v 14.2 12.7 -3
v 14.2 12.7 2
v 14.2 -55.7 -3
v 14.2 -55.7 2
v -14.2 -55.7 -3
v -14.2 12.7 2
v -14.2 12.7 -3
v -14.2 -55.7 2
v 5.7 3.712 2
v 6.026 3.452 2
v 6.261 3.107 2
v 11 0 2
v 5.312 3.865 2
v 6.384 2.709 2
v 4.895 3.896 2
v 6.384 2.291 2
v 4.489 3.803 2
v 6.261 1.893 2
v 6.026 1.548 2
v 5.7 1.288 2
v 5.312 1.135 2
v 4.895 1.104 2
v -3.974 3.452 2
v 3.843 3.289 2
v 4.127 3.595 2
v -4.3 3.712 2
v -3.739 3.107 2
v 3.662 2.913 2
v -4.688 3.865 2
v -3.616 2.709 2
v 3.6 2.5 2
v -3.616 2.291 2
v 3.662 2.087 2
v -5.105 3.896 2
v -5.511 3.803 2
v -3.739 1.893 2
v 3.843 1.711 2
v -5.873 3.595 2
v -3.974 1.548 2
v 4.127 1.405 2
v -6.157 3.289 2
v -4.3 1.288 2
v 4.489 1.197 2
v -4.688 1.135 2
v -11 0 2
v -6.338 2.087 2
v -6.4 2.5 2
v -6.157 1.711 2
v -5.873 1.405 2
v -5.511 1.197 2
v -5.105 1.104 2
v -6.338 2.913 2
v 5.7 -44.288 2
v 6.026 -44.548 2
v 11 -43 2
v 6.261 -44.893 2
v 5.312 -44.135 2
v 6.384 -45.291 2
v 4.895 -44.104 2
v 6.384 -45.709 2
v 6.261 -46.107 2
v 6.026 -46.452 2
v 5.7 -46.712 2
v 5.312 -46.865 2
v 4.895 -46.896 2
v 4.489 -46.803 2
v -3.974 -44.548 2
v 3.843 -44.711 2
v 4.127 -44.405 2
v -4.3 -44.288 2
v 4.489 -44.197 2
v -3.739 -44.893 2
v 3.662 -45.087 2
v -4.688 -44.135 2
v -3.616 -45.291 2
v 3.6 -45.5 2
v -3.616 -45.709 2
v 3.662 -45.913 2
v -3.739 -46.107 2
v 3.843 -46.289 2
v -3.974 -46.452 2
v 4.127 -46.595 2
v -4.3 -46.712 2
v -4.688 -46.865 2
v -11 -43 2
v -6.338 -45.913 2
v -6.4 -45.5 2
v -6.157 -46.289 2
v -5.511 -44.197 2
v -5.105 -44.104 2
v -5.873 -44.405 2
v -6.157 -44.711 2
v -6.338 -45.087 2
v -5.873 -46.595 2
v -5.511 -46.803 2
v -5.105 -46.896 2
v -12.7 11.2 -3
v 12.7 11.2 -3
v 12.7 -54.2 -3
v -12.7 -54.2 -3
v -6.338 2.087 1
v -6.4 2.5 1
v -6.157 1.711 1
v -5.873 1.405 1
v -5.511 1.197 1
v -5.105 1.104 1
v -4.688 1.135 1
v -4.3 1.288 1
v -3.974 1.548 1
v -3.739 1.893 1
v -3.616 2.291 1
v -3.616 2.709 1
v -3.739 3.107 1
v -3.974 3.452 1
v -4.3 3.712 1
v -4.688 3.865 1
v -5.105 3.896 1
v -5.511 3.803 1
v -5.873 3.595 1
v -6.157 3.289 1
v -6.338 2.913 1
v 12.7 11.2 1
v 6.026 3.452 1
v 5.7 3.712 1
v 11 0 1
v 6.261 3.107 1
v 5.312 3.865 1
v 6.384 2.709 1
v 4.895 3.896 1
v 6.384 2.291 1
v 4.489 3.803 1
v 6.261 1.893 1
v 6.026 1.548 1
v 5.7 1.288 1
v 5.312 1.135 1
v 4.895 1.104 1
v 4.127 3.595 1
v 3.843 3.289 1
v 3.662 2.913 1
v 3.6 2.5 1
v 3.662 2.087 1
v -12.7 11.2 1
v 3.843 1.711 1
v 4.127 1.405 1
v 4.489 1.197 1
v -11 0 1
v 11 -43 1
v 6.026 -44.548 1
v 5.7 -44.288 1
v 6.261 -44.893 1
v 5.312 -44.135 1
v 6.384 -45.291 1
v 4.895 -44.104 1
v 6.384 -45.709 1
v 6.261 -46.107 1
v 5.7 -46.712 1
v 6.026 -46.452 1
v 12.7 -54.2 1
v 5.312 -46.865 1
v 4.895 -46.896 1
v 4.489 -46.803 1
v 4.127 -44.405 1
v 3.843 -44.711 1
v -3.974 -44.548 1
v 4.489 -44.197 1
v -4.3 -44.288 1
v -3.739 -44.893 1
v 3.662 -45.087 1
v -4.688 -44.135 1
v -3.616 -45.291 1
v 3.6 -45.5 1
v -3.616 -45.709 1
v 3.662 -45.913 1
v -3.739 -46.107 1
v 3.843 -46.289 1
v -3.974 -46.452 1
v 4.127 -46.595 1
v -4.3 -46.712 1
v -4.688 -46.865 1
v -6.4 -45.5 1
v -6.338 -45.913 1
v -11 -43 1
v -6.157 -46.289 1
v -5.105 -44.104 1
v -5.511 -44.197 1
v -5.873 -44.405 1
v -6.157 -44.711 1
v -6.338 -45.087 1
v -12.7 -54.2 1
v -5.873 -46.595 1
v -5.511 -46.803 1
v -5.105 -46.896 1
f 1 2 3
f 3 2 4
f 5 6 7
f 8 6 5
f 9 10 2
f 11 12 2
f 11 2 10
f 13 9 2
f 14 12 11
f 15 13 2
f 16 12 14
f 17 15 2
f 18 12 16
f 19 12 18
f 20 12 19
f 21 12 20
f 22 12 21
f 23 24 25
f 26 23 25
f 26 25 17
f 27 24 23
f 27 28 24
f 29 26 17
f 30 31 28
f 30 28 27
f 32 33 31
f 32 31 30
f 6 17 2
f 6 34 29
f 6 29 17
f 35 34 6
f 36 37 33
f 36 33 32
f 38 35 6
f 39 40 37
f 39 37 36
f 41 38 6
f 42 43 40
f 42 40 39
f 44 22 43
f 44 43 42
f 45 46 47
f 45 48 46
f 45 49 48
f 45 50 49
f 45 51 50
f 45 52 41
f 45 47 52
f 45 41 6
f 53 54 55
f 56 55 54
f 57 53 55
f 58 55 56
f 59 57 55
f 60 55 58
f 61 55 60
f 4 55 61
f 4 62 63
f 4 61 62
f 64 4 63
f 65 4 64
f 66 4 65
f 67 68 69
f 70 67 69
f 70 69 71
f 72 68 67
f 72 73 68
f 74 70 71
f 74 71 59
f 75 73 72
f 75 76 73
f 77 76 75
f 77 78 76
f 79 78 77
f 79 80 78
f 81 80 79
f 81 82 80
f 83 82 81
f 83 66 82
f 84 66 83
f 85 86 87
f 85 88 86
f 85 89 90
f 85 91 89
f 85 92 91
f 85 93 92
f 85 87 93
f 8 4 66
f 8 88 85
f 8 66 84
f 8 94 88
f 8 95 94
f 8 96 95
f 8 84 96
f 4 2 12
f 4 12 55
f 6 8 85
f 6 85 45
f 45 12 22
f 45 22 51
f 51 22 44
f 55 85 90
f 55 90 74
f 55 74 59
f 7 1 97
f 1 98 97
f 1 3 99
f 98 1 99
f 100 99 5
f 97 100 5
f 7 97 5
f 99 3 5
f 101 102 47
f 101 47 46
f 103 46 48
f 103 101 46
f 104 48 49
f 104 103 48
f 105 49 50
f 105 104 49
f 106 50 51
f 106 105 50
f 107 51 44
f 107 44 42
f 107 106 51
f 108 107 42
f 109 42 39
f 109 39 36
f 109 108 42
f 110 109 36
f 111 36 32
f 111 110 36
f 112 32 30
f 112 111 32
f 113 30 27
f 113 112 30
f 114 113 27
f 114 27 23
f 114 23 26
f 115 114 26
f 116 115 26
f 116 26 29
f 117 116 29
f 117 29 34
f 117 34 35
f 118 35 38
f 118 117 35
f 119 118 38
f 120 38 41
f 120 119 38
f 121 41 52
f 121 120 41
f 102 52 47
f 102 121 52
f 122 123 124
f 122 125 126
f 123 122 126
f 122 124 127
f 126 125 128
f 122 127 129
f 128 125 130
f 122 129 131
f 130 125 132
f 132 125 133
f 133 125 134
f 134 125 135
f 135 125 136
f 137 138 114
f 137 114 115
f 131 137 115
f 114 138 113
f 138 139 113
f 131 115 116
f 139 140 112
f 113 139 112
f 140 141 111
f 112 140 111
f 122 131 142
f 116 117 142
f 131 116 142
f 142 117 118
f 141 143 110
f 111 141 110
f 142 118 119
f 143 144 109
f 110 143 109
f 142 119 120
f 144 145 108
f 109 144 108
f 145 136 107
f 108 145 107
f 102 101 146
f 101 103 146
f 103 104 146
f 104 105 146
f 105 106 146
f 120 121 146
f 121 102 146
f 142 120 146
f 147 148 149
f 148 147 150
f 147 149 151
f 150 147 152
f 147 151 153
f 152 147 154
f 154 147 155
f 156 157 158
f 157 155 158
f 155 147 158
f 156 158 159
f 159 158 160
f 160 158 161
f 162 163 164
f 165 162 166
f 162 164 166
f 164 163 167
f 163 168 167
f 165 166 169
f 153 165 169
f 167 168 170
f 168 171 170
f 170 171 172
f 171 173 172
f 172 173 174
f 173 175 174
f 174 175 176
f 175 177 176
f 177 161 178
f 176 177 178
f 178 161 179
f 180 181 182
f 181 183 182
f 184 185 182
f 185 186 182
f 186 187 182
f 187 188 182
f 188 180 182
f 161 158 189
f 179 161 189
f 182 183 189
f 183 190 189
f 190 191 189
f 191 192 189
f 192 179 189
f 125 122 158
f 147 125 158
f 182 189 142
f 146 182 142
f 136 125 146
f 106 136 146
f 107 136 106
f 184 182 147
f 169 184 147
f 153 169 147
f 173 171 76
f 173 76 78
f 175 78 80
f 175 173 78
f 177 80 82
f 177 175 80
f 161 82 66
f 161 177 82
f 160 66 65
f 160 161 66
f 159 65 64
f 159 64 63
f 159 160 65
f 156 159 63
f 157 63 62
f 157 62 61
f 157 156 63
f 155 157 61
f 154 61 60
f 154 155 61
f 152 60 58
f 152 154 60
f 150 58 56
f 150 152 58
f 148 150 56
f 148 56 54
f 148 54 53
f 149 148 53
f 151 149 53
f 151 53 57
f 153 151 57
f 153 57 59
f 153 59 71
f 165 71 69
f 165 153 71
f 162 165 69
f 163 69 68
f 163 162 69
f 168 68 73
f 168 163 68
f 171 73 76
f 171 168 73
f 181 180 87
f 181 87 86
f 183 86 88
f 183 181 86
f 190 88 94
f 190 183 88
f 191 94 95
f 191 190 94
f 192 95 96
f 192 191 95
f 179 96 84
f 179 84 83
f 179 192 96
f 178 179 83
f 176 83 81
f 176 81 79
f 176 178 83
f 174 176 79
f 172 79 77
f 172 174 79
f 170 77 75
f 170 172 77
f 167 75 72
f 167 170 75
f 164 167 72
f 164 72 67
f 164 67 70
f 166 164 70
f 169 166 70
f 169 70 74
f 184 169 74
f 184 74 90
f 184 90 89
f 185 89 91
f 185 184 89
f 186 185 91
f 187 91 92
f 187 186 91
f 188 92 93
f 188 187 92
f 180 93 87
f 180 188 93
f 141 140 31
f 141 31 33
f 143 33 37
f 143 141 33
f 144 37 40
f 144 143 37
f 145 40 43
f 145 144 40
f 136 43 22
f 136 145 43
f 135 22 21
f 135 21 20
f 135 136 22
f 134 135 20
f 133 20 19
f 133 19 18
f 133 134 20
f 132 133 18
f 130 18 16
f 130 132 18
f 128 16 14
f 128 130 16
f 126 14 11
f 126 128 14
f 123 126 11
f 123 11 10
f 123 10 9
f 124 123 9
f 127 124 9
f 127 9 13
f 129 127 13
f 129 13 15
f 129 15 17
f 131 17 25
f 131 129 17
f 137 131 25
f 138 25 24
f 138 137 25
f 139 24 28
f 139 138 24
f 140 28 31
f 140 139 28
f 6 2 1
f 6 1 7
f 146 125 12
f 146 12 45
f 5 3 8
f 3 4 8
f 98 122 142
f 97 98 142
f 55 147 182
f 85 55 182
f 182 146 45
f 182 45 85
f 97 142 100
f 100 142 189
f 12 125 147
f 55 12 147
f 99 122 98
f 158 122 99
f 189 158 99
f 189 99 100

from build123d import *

# Parameters (mm, degrees)
CYLINDER005_R     = 1.4
CYLINDER005_DEPTH = 10
SKETCH001_W       = 28.4
SKETCH001_H       = 68.4
SKETCH001_W_2     = 25.4
SKETCH001_H_2     = 65.4
EXTRUDE001_DEPTH  = 4
SKETCH_W          = 28.4
SKETCH_H          = 68.4
SKETCH_R          = 1.4
SKETCH_W_2        = 22
SKETCH_H_2        = 43
EXTRUDE_DEPTH     = 1


with BuildPart() as cylinder005:
    # Cylinder005 → Cylinder005 (new body)
    with BuildSketch(Plane(origin=(-5, 2.5, -5), x_dir=(1, 0, 0), z_dir=(0, 0, 1))):
        Circle(CYLINDER005_R)
    extrude(amount=CYLINDER005_DEPTH)


with BuildPart() as extrude001:
    # Sketch001 → Extrude001 (new body)
    with BuildSketch(Plane.XY.offset(1)):
        with Locations((0, -21.5)):
            Rectangle(SKETCH001_W, SKETCH001_H)
        with Locations((0, -21.5)):
            Rectangle(SKETCH001_W_2, SKETCH001_H_2, mode=Mode.SUBTRACT)
    extrude(amount=-EXTRUDE001_DEPTH)


with BuildPart() as body001:
    # Sketch → Extrude (new body)
    with BuildSketch(Plane.XY.offset(1)):
        with Locations((0, -21.5)):
            Rectangle(SKETCH_W, SKETCH_H)
        with Locations((-5, 2.5)):
            Circle(SKETCH_R, mode=Mode.SUBTRACT)
        with Locations((5, 2.5)):
            Circle(SKETCH_R, mode=Mode.SUBTRACT)
        with Locations((-5, -45.5)):
            Circle(SKETCH_R, mode=Mode.SUBTRACT)
        with Locations((5, -45.5)):
            Circle(SKETCH_R, mode=Mode.SUBTRACT)
        with Locations((0, -21.5)):
            Rectangle(SKETCH_W_2, SKETCH_H_2, mode=Mode.SUBTRACT)
    extrude(amount=EXTRUDE_DEPTH)

    # Fusion012: union Extrude001
    add(extrude001.part)

    # Cut001: cut Cylinder005
    add(cylinder005.part, mode=Mode.SUBTRACT)


with BuildPart() as body003:
    # Part__Mirroring002: instance of Body001
    add(body001.part.mirror(Plane(origin=(0, -21.5, 0), x_dir=(1, 0, 0), z_dir=(0, 1, 0))))


with BuildPart() as part_mirroring004:
    # Part__Mirroring004: instance of Body003
    add(body003.part.mirror(Plane(origin=(0, -21.5, 0), x_dir=(0, -1, 0), z_dir=(1, 0, 0))))


solid = part_mirroring004.part
